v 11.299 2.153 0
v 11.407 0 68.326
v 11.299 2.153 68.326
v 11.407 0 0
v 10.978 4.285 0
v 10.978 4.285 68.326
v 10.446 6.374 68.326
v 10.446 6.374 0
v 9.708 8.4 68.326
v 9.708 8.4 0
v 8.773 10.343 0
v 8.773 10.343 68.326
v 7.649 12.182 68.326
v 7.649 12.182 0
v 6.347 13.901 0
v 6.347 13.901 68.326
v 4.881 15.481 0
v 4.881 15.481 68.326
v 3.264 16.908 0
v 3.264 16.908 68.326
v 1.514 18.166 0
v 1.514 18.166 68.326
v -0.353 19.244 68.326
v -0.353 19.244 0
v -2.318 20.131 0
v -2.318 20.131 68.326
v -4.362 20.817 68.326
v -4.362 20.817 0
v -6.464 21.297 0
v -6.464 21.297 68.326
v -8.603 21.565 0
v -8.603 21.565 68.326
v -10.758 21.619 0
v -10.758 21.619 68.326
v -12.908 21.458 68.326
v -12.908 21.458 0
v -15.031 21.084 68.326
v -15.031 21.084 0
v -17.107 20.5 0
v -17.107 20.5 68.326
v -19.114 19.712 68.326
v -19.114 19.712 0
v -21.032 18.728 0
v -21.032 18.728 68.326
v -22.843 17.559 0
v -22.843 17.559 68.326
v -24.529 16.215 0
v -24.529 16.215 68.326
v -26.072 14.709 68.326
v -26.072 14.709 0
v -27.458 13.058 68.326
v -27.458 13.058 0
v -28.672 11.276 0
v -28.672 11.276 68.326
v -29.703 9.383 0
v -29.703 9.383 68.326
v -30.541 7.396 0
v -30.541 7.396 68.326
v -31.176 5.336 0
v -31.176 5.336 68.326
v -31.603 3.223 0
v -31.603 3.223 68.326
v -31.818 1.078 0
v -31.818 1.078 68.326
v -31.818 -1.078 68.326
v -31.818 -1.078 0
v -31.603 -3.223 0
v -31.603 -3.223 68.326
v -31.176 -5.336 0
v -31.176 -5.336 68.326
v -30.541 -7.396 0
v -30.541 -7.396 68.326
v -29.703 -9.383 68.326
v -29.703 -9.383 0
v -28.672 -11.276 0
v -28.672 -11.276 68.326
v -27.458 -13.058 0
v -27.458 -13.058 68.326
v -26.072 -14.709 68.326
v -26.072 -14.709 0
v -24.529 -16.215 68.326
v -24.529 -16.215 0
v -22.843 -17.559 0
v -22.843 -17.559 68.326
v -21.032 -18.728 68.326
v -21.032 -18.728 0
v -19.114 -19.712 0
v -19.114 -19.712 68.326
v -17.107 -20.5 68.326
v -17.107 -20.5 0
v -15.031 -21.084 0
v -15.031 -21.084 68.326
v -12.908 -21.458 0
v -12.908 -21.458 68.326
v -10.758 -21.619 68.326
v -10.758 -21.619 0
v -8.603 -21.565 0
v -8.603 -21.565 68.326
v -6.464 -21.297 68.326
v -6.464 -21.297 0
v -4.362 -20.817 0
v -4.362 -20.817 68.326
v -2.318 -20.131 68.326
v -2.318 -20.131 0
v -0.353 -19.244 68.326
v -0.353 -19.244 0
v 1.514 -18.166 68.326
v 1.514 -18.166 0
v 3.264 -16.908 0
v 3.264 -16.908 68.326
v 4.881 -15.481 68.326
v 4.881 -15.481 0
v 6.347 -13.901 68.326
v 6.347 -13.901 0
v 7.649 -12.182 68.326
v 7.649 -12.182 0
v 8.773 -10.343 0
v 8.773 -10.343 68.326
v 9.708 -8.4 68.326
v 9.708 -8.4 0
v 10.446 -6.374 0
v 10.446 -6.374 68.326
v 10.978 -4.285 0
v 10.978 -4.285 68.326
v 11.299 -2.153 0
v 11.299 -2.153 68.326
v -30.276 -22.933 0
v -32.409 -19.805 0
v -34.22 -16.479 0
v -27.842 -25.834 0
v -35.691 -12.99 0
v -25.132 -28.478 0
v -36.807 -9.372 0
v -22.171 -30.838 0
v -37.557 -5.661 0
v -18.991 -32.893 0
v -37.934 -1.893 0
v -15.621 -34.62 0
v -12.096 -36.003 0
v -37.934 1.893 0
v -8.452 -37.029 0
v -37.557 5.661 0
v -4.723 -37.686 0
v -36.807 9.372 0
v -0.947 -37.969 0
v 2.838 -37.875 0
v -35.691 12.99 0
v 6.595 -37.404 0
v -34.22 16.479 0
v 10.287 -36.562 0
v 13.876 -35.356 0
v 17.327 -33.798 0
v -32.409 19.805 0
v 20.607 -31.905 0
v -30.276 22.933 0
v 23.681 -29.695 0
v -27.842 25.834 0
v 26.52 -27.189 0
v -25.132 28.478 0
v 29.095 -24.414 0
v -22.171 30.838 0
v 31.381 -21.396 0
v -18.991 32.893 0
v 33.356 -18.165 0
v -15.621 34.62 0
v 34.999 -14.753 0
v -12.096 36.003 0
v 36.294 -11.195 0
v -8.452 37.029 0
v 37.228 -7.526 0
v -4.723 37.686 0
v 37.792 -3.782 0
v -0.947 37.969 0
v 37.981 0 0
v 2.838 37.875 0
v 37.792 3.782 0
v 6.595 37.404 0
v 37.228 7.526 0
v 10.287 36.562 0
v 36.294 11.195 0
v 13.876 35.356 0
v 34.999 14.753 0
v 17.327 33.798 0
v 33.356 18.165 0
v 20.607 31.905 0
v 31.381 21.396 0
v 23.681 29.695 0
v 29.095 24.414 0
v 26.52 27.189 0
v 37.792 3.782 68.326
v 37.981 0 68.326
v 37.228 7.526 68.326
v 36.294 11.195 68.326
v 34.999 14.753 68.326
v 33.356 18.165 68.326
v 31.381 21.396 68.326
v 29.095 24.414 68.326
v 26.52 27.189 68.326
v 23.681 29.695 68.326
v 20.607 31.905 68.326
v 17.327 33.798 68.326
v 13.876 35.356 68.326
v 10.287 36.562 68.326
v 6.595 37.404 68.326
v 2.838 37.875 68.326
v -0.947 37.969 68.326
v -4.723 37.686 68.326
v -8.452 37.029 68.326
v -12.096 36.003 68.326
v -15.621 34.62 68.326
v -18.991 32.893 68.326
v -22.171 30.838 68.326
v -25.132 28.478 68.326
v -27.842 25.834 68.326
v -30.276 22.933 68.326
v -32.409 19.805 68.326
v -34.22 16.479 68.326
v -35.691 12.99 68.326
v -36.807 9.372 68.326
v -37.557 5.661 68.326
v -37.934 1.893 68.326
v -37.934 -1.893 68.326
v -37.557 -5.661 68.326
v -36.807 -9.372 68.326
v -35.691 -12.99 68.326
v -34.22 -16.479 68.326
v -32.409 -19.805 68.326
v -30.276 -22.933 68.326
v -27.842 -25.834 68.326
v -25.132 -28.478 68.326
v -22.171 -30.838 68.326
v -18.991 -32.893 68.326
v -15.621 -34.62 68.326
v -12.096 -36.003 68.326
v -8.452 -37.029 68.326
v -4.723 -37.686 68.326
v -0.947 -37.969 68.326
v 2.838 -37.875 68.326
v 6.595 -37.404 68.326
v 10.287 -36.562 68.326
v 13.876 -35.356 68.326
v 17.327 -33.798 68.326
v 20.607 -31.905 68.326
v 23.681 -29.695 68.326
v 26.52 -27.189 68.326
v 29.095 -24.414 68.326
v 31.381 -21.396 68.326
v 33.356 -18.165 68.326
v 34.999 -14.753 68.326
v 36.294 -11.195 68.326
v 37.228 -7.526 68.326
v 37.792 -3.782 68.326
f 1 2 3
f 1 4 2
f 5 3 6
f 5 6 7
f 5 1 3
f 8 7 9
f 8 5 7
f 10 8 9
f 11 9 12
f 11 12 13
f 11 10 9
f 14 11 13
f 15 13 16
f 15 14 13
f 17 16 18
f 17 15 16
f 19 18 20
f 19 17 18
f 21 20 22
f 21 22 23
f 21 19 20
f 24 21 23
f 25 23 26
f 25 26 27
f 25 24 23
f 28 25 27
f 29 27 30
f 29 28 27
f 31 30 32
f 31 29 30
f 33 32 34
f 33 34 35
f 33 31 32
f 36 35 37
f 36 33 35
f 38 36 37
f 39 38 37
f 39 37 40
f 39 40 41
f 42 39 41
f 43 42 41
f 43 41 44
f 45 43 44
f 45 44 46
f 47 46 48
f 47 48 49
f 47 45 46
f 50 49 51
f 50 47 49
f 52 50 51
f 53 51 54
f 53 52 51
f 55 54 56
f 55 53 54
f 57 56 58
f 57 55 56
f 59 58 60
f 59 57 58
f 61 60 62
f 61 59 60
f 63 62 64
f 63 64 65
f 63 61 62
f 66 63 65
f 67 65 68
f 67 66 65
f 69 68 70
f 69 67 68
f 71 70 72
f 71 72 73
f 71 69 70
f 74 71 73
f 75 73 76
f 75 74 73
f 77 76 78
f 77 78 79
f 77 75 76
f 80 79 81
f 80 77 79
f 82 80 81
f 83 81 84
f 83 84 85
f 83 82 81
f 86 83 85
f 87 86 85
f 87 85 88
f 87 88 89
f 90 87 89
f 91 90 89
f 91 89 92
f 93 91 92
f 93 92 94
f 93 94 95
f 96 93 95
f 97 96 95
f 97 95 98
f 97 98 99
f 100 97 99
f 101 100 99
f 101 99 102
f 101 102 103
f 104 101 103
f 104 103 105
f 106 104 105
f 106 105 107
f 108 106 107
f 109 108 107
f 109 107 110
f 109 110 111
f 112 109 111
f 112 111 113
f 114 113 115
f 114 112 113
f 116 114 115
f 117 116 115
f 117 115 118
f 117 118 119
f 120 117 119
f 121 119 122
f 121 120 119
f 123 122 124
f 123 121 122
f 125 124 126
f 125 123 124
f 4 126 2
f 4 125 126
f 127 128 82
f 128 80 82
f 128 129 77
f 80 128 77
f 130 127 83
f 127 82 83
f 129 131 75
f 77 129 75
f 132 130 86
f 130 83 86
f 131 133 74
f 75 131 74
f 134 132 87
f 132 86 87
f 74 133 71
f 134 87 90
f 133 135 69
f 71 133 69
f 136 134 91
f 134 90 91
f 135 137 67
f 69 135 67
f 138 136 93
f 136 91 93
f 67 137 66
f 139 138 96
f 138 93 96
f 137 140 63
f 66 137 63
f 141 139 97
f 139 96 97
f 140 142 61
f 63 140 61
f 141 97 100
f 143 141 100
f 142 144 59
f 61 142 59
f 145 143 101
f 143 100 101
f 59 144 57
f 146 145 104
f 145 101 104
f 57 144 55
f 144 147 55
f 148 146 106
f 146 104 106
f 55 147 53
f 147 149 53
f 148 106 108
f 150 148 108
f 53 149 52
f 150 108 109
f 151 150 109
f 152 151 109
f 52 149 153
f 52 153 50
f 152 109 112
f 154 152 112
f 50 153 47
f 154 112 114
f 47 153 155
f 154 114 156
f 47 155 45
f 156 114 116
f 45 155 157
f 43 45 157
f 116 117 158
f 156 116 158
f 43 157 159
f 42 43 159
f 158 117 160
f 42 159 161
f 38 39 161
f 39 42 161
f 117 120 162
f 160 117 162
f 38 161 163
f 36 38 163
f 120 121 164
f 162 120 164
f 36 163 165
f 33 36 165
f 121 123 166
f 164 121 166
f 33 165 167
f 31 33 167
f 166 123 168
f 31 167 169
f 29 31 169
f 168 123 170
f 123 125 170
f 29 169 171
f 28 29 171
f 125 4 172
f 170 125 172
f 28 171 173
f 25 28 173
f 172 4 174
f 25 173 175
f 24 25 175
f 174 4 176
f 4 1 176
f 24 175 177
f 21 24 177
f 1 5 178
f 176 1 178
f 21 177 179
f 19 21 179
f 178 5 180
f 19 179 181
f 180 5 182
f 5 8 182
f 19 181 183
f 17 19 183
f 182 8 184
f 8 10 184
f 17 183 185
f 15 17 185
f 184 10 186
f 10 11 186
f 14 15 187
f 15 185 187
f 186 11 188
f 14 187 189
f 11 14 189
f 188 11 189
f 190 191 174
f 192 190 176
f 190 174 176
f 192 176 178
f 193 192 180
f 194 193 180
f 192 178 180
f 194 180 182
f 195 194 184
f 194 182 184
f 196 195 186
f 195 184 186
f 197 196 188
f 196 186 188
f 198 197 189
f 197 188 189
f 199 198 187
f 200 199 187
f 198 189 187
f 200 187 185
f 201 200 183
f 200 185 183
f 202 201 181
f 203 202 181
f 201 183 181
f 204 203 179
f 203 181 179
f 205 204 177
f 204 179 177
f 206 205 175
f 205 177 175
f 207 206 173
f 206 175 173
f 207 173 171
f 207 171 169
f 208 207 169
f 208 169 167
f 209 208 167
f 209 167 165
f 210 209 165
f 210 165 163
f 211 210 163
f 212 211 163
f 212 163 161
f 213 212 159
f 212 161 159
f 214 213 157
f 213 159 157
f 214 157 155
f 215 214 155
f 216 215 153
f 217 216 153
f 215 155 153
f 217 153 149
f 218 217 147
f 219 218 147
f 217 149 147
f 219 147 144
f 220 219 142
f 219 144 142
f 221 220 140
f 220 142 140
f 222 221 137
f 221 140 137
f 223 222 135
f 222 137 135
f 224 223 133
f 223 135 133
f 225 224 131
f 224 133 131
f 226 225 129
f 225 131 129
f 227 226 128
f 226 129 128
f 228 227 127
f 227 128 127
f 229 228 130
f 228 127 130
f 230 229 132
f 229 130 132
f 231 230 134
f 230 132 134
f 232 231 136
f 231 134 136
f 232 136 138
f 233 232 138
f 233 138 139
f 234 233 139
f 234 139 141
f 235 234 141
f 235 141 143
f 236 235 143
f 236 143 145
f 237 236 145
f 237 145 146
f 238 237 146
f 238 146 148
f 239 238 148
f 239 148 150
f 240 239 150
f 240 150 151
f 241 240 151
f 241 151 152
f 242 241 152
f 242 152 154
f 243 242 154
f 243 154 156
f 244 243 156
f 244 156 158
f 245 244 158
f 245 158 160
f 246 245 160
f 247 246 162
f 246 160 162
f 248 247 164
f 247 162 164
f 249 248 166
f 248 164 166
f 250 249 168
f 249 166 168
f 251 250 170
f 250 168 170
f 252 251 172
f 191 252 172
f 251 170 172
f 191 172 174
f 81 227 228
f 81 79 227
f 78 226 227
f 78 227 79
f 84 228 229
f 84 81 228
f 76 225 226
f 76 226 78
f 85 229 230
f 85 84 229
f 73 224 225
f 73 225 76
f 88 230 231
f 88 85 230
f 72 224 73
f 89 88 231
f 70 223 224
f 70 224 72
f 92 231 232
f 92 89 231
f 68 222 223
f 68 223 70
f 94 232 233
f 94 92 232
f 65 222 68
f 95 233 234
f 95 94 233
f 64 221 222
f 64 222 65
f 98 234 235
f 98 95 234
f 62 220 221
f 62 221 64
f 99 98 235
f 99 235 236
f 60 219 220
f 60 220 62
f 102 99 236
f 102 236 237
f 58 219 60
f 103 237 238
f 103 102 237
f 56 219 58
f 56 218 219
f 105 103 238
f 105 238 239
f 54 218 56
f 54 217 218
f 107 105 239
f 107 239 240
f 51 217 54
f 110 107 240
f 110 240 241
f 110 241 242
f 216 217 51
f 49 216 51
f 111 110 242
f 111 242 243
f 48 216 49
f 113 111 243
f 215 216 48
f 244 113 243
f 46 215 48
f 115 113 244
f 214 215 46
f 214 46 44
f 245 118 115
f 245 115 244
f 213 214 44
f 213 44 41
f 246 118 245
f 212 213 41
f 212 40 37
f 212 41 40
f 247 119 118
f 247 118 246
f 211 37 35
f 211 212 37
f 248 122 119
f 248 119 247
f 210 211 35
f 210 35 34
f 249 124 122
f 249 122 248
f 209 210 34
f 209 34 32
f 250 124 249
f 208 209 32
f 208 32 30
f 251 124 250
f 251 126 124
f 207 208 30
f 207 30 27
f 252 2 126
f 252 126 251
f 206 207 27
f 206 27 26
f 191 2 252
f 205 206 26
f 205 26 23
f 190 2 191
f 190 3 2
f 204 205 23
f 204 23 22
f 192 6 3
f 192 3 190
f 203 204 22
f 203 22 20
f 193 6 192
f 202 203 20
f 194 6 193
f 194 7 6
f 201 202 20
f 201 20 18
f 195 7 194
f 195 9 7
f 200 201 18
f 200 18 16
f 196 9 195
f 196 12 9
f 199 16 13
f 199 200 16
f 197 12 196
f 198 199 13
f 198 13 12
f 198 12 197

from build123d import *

# Parameters (mm, degrees)
F0_R        = 37.981107
F0_R_2      = 21.625719
F1_DEPTH    = 42.926
F1_FACE_R   = 37.981107
F1_FACE_R_2 = 21.625719
F2_DEPTH    = 14.224
F3_DEPTH    = 25.4


with BuildPart() as f1:
    # F0 (on Top) → F1 (new body)
    with BuildSketch(Plane.XY):
        Circle(F0_R)
        with Locations((-10.219174, 0)):
            Circle(F0_R_2, mode=Mode.SUBTRACT)
    extrude(amount=F1_DEPTH)

    # F1_face (on face) → F2 (cut)
    with BuildSketch(Plane(origin=(4.902302, 0, 42.926), x_dir=(1, 0, 0), z_dir=(0, 0, 1))):
        with Locations((-4.902302, 0)):
            Circle(F1_FACE_R)
        with Locations((-15.121476, 0)):
            Circle(F1_FACE_R_2, mode=Mode.SUBTRACT)
    extrude(amount=F2_DEPTH, mode=Mode.SUBTRACT)

    # F1_face (on face) → F3 (join)
    with BuildSketch(Plane(origin=(4.902302, 0, 42.926), x_dir=(1, 0, 0), z_dir=(0, 0, 1))):
        with Locations((-4.902302, 0)):
            Circle(F1_FACE_R)
        with Locations((-15.121476, 0)):
            Circle(F1_FACE_R_2, mode=Mode.SUBTRACT)
    extrude(amount=F3_DEPTH)


solid = f1.part
